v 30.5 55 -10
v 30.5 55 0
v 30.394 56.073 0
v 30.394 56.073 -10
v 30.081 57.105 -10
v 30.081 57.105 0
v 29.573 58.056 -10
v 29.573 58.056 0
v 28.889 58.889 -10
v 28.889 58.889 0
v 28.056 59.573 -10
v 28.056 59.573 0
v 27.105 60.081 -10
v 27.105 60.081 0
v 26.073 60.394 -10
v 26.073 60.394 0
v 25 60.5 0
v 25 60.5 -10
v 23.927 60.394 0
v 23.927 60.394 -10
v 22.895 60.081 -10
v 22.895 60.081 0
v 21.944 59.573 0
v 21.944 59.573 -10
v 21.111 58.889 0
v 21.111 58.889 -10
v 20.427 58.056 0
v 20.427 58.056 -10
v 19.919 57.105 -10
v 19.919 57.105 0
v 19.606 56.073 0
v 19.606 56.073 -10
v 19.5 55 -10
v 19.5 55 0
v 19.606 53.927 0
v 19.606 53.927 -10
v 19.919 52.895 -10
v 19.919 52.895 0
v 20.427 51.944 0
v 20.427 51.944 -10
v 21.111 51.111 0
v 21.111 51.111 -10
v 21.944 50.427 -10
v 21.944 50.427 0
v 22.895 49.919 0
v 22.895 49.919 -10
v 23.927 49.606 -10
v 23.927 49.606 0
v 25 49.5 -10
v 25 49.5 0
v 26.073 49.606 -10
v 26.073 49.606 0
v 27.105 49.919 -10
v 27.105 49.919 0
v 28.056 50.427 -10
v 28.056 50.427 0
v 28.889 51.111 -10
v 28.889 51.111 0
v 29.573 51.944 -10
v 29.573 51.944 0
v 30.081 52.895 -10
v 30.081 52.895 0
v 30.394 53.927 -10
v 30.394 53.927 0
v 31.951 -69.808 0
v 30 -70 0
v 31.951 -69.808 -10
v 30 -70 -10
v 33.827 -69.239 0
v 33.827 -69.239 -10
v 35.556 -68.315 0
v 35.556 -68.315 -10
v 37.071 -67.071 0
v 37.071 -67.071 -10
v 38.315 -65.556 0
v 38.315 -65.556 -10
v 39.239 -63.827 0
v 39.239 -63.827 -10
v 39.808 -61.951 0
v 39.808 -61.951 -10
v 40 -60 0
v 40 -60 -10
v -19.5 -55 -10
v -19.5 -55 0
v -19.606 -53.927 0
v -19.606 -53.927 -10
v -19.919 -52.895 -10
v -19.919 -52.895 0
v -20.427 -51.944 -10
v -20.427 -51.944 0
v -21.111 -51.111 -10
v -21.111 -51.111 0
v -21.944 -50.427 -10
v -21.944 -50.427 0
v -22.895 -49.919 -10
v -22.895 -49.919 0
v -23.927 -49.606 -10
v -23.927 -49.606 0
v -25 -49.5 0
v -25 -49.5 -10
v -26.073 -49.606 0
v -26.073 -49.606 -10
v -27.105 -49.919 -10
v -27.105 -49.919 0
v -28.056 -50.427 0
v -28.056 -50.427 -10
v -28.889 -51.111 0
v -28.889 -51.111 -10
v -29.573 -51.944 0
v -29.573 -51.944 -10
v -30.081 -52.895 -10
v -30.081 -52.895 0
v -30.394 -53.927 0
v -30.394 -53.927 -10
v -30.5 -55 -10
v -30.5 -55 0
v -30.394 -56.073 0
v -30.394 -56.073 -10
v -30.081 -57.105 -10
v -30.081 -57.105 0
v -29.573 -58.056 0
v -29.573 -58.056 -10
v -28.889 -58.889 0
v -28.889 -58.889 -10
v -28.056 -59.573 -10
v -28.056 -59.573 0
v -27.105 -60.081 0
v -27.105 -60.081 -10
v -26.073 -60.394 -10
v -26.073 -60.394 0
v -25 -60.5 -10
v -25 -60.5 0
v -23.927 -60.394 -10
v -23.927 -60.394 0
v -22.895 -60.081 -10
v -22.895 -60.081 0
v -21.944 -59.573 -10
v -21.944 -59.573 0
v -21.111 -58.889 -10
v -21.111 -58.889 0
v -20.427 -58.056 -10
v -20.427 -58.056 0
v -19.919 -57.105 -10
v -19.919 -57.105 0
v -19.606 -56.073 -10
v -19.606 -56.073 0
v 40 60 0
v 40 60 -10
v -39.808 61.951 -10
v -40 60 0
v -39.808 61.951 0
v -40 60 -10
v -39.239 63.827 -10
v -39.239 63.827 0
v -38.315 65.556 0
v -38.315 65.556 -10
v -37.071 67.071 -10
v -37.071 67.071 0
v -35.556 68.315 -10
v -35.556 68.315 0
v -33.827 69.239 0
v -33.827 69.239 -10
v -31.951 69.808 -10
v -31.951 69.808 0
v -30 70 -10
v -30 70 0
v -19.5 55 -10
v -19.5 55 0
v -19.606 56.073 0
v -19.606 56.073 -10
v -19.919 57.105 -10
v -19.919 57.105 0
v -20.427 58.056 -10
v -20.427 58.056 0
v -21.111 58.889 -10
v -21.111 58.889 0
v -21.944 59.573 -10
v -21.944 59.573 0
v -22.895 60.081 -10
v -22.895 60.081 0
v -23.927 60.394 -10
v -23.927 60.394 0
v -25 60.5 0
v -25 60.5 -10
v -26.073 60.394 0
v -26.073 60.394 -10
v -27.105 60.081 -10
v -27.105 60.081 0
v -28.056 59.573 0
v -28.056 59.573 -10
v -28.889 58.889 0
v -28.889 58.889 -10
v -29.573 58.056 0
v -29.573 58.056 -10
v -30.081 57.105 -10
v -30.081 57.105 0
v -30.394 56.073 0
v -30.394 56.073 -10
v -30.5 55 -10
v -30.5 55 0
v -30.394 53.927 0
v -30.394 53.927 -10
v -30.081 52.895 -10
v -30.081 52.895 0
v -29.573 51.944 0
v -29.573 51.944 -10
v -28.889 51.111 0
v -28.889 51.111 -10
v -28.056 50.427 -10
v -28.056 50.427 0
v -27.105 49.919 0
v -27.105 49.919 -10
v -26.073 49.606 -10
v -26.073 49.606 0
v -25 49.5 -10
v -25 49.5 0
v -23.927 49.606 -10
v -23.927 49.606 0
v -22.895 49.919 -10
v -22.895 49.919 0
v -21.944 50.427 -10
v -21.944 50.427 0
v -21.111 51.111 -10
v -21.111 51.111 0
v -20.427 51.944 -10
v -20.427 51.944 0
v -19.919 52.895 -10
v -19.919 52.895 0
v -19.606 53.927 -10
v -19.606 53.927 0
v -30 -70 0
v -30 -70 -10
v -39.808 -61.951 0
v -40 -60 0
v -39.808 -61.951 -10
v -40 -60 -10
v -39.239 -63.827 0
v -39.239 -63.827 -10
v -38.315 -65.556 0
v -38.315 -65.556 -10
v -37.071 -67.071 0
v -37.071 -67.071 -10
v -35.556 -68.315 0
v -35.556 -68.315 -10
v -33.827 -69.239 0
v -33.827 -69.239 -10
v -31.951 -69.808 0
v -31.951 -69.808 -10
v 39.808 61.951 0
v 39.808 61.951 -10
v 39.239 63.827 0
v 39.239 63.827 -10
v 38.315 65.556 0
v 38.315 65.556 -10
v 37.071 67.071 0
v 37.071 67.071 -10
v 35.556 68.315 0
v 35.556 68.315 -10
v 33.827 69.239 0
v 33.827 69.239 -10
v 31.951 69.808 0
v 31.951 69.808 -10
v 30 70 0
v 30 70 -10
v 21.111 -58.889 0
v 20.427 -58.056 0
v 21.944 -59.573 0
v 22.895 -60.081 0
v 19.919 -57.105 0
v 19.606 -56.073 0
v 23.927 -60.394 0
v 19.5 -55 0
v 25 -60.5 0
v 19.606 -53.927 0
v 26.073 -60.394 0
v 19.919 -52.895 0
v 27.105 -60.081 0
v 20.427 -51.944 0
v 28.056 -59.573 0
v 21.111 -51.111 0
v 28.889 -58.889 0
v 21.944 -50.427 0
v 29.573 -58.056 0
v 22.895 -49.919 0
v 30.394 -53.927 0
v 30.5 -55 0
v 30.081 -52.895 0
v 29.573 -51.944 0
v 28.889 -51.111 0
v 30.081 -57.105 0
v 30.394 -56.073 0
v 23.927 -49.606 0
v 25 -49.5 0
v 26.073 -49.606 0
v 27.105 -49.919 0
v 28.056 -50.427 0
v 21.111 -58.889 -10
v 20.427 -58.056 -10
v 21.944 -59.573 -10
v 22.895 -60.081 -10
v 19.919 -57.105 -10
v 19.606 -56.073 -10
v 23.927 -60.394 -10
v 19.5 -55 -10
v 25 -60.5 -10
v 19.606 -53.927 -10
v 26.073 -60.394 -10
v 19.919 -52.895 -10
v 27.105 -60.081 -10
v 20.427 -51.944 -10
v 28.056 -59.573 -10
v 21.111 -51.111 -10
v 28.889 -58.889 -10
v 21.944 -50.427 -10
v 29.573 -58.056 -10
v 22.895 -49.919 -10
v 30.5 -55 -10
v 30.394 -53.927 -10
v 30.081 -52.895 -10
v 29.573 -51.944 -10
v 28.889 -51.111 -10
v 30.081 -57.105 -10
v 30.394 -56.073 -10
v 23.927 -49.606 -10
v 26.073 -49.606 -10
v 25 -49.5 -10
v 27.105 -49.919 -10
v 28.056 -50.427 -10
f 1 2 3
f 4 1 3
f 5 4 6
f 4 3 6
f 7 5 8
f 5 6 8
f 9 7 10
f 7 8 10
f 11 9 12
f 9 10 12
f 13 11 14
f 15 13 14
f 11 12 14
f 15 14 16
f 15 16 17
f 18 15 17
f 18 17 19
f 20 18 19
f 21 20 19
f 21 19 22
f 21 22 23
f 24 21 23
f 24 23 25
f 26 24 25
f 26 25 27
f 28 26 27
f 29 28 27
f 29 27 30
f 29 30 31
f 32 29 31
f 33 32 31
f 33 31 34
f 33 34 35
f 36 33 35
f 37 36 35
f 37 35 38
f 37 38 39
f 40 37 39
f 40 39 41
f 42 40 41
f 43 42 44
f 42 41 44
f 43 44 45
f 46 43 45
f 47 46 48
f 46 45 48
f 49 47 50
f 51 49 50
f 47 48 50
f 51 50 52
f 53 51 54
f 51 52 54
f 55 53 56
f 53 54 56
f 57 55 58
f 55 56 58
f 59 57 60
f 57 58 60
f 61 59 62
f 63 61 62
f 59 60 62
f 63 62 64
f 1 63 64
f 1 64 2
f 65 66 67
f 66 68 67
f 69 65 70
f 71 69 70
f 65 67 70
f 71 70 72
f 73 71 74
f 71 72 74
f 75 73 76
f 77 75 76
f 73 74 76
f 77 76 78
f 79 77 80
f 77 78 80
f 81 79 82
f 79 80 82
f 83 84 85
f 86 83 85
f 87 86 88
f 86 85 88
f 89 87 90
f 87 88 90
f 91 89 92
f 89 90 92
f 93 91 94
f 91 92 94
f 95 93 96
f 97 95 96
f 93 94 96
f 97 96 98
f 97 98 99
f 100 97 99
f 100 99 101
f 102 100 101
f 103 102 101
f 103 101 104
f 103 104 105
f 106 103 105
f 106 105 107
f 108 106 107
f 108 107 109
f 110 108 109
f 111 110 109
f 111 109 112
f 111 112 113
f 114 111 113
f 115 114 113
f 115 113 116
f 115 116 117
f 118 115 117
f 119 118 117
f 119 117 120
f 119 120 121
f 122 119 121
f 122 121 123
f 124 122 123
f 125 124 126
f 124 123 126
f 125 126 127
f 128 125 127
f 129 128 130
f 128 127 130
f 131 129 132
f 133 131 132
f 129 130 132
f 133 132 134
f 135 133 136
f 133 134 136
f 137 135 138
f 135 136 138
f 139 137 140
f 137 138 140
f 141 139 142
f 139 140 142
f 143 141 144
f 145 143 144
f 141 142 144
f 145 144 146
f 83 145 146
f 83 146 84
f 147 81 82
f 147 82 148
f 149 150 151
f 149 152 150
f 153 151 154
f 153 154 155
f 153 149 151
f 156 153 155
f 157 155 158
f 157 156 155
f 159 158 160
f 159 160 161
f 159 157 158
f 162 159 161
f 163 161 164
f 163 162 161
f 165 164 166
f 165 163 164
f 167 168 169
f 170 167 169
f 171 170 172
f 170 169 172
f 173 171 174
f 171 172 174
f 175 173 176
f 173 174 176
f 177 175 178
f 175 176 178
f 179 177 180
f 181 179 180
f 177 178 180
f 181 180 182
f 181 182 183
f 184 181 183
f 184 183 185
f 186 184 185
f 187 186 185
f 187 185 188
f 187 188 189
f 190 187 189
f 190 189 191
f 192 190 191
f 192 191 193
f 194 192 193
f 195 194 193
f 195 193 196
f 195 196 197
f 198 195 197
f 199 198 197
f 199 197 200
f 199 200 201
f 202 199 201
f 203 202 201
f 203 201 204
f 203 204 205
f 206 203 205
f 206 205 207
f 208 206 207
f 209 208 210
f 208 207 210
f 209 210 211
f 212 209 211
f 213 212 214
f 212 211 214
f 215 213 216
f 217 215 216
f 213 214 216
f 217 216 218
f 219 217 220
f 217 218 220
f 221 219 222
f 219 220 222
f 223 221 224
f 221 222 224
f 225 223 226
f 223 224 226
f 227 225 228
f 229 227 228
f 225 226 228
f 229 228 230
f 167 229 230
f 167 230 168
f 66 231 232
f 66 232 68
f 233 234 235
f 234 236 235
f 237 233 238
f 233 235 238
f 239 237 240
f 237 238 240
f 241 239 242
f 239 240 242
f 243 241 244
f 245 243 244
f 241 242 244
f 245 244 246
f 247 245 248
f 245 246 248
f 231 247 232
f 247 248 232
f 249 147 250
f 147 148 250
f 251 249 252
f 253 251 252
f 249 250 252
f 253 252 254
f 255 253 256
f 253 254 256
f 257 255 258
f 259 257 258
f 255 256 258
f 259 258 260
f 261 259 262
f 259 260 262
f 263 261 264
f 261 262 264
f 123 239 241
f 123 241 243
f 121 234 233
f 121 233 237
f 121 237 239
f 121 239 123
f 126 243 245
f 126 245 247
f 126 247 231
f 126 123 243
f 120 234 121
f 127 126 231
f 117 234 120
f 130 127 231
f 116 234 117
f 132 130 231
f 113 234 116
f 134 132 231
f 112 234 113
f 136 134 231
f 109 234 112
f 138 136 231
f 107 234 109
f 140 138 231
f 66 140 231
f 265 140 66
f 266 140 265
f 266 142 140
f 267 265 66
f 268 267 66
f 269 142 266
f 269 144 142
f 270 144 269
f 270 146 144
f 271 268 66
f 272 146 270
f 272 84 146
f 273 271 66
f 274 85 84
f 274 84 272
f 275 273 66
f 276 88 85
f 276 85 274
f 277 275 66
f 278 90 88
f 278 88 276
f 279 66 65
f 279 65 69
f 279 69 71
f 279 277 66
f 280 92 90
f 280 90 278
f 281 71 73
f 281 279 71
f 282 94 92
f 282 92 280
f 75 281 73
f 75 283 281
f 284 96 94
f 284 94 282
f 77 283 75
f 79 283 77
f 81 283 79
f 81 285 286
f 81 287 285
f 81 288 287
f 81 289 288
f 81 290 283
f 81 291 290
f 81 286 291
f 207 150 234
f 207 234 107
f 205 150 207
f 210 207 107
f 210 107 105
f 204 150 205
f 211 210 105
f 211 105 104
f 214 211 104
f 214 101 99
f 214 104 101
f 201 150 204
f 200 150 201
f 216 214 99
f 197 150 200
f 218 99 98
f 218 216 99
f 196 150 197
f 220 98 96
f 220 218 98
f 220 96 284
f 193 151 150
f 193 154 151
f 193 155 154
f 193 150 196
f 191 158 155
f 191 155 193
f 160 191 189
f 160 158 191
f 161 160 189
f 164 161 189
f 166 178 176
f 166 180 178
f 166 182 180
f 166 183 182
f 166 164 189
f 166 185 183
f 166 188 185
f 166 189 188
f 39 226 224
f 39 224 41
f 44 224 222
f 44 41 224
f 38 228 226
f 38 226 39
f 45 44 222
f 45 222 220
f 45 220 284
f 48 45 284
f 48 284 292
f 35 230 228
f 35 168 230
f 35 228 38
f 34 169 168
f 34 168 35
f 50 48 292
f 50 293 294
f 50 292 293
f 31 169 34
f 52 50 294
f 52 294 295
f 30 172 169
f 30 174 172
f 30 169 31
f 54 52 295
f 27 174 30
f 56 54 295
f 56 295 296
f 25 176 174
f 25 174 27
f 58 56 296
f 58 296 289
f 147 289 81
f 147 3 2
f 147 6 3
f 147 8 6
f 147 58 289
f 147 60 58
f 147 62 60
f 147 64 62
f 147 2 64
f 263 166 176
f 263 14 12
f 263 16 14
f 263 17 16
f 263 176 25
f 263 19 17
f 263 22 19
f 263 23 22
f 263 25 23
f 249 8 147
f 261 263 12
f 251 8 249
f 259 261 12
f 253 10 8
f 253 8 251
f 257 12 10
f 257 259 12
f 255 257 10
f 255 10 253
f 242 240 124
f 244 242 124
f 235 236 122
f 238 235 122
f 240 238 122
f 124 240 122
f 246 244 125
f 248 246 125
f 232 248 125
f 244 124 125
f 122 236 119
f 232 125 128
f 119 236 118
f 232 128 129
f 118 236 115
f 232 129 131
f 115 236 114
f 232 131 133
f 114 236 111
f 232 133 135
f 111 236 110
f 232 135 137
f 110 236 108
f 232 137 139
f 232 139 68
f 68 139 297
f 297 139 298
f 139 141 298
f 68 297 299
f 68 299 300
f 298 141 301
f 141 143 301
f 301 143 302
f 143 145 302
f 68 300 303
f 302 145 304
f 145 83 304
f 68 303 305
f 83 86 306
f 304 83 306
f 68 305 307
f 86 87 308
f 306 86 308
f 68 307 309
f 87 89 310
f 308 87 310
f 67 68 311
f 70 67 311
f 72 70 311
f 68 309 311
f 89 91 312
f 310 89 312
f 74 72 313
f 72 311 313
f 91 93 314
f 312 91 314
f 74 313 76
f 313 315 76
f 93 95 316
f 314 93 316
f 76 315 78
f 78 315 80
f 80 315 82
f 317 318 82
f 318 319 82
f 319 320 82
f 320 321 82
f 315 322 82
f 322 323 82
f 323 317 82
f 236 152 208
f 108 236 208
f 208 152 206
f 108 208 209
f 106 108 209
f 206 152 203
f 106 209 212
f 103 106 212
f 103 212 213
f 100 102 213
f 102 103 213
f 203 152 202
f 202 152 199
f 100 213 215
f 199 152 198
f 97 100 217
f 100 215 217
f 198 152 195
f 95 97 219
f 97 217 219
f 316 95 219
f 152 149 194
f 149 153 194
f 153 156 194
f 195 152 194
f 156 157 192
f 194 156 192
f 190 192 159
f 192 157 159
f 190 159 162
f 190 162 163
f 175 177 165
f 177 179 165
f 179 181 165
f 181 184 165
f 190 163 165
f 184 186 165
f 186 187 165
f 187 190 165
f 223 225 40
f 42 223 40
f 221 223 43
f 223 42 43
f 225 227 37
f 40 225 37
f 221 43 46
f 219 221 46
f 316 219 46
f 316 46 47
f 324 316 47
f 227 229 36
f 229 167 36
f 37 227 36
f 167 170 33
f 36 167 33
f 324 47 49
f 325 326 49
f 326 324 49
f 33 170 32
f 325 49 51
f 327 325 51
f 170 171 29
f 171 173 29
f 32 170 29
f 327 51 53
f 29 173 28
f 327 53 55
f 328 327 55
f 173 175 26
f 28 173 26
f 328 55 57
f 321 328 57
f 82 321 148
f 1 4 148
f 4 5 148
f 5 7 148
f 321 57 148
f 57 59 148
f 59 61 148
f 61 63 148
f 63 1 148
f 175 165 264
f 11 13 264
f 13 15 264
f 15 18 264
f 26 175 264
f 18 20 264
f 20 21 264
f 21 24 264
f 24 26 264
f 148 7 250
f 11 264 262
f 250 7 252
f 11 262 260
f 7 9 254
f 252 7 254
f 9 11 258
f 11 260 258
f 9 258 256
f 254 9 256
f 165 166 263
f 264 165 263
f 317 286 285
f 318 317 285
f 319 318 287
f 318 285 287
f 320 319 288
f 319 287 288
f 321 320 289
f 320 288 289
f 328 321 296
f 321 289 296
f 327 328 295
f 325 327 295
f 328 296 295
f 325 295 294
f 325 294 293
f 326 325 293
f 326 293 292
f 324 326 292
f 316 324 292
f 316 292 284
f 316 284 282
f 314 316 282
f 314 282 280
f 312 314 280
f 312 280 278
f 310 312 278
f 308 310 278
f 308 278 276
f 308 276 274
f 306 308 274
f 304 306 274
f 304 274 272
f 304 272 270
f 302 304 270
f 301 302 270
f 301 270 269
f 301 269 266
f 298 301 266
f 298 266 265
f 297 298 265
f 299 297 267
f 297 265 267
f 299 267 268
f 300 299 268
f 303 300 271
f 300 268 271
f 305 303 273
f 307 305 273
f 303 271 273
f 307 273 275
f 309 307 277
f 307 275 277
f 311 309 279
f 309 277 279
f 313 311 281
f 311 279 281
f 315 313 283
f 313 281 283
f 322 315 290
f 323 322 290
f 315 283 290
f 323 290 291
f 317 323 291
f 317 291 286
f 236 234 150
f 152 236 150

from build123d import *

# Parameters (mm, degrees)
IZIM1_W               = 80
IZIM1_H               = 140
TABAN_FLAN_1_DEPTH    = 10
RADYUS1_R             = 10
IZIM2_R               = 5.5
KES_EKSTR_ZYON1_DEPTH = 20


# Sheet-metal steps are written as plain solids
with BuildPart() as part:
    # Çizim1 → Taban-Flanş1 (new body)
    with BuildSketch(Plane.XY):
        Rectangle(IZIM1_W, IZIM1_H)
    extrude(amount=-TABAN_FLAN_1_DEPTH)

    # Radyus1
    radyus1_edges = [part.edges().sort_by_distance(p)[0] for p in [
        (40, -70, -5),
        (-40, -70, -5),
        (-40, 70, -5),
        (40, 70, -5),
    ]]
    fillet(radyus1_edges, radius=RADYUS1_R)

    # Çizim2 → Kes-Ekstrüzyon1 (cut)
    with BuildSketch(Plane.XY):
        with Locations((25, 55)):
            Circle(IZIM2_R)
        with Locations((-25, 55)):
            Circle(IZIM2_R)
        with Locations((-25, -55)):
            Circle(IZIM2_R)
        with Locations((25, -55)):
            Circle(IZIM2_R)
    extrude(amount=-KES_EKSTR_ZYON1_DEPTH, mode=Mode.SUBTRACT)


solid = part.part
